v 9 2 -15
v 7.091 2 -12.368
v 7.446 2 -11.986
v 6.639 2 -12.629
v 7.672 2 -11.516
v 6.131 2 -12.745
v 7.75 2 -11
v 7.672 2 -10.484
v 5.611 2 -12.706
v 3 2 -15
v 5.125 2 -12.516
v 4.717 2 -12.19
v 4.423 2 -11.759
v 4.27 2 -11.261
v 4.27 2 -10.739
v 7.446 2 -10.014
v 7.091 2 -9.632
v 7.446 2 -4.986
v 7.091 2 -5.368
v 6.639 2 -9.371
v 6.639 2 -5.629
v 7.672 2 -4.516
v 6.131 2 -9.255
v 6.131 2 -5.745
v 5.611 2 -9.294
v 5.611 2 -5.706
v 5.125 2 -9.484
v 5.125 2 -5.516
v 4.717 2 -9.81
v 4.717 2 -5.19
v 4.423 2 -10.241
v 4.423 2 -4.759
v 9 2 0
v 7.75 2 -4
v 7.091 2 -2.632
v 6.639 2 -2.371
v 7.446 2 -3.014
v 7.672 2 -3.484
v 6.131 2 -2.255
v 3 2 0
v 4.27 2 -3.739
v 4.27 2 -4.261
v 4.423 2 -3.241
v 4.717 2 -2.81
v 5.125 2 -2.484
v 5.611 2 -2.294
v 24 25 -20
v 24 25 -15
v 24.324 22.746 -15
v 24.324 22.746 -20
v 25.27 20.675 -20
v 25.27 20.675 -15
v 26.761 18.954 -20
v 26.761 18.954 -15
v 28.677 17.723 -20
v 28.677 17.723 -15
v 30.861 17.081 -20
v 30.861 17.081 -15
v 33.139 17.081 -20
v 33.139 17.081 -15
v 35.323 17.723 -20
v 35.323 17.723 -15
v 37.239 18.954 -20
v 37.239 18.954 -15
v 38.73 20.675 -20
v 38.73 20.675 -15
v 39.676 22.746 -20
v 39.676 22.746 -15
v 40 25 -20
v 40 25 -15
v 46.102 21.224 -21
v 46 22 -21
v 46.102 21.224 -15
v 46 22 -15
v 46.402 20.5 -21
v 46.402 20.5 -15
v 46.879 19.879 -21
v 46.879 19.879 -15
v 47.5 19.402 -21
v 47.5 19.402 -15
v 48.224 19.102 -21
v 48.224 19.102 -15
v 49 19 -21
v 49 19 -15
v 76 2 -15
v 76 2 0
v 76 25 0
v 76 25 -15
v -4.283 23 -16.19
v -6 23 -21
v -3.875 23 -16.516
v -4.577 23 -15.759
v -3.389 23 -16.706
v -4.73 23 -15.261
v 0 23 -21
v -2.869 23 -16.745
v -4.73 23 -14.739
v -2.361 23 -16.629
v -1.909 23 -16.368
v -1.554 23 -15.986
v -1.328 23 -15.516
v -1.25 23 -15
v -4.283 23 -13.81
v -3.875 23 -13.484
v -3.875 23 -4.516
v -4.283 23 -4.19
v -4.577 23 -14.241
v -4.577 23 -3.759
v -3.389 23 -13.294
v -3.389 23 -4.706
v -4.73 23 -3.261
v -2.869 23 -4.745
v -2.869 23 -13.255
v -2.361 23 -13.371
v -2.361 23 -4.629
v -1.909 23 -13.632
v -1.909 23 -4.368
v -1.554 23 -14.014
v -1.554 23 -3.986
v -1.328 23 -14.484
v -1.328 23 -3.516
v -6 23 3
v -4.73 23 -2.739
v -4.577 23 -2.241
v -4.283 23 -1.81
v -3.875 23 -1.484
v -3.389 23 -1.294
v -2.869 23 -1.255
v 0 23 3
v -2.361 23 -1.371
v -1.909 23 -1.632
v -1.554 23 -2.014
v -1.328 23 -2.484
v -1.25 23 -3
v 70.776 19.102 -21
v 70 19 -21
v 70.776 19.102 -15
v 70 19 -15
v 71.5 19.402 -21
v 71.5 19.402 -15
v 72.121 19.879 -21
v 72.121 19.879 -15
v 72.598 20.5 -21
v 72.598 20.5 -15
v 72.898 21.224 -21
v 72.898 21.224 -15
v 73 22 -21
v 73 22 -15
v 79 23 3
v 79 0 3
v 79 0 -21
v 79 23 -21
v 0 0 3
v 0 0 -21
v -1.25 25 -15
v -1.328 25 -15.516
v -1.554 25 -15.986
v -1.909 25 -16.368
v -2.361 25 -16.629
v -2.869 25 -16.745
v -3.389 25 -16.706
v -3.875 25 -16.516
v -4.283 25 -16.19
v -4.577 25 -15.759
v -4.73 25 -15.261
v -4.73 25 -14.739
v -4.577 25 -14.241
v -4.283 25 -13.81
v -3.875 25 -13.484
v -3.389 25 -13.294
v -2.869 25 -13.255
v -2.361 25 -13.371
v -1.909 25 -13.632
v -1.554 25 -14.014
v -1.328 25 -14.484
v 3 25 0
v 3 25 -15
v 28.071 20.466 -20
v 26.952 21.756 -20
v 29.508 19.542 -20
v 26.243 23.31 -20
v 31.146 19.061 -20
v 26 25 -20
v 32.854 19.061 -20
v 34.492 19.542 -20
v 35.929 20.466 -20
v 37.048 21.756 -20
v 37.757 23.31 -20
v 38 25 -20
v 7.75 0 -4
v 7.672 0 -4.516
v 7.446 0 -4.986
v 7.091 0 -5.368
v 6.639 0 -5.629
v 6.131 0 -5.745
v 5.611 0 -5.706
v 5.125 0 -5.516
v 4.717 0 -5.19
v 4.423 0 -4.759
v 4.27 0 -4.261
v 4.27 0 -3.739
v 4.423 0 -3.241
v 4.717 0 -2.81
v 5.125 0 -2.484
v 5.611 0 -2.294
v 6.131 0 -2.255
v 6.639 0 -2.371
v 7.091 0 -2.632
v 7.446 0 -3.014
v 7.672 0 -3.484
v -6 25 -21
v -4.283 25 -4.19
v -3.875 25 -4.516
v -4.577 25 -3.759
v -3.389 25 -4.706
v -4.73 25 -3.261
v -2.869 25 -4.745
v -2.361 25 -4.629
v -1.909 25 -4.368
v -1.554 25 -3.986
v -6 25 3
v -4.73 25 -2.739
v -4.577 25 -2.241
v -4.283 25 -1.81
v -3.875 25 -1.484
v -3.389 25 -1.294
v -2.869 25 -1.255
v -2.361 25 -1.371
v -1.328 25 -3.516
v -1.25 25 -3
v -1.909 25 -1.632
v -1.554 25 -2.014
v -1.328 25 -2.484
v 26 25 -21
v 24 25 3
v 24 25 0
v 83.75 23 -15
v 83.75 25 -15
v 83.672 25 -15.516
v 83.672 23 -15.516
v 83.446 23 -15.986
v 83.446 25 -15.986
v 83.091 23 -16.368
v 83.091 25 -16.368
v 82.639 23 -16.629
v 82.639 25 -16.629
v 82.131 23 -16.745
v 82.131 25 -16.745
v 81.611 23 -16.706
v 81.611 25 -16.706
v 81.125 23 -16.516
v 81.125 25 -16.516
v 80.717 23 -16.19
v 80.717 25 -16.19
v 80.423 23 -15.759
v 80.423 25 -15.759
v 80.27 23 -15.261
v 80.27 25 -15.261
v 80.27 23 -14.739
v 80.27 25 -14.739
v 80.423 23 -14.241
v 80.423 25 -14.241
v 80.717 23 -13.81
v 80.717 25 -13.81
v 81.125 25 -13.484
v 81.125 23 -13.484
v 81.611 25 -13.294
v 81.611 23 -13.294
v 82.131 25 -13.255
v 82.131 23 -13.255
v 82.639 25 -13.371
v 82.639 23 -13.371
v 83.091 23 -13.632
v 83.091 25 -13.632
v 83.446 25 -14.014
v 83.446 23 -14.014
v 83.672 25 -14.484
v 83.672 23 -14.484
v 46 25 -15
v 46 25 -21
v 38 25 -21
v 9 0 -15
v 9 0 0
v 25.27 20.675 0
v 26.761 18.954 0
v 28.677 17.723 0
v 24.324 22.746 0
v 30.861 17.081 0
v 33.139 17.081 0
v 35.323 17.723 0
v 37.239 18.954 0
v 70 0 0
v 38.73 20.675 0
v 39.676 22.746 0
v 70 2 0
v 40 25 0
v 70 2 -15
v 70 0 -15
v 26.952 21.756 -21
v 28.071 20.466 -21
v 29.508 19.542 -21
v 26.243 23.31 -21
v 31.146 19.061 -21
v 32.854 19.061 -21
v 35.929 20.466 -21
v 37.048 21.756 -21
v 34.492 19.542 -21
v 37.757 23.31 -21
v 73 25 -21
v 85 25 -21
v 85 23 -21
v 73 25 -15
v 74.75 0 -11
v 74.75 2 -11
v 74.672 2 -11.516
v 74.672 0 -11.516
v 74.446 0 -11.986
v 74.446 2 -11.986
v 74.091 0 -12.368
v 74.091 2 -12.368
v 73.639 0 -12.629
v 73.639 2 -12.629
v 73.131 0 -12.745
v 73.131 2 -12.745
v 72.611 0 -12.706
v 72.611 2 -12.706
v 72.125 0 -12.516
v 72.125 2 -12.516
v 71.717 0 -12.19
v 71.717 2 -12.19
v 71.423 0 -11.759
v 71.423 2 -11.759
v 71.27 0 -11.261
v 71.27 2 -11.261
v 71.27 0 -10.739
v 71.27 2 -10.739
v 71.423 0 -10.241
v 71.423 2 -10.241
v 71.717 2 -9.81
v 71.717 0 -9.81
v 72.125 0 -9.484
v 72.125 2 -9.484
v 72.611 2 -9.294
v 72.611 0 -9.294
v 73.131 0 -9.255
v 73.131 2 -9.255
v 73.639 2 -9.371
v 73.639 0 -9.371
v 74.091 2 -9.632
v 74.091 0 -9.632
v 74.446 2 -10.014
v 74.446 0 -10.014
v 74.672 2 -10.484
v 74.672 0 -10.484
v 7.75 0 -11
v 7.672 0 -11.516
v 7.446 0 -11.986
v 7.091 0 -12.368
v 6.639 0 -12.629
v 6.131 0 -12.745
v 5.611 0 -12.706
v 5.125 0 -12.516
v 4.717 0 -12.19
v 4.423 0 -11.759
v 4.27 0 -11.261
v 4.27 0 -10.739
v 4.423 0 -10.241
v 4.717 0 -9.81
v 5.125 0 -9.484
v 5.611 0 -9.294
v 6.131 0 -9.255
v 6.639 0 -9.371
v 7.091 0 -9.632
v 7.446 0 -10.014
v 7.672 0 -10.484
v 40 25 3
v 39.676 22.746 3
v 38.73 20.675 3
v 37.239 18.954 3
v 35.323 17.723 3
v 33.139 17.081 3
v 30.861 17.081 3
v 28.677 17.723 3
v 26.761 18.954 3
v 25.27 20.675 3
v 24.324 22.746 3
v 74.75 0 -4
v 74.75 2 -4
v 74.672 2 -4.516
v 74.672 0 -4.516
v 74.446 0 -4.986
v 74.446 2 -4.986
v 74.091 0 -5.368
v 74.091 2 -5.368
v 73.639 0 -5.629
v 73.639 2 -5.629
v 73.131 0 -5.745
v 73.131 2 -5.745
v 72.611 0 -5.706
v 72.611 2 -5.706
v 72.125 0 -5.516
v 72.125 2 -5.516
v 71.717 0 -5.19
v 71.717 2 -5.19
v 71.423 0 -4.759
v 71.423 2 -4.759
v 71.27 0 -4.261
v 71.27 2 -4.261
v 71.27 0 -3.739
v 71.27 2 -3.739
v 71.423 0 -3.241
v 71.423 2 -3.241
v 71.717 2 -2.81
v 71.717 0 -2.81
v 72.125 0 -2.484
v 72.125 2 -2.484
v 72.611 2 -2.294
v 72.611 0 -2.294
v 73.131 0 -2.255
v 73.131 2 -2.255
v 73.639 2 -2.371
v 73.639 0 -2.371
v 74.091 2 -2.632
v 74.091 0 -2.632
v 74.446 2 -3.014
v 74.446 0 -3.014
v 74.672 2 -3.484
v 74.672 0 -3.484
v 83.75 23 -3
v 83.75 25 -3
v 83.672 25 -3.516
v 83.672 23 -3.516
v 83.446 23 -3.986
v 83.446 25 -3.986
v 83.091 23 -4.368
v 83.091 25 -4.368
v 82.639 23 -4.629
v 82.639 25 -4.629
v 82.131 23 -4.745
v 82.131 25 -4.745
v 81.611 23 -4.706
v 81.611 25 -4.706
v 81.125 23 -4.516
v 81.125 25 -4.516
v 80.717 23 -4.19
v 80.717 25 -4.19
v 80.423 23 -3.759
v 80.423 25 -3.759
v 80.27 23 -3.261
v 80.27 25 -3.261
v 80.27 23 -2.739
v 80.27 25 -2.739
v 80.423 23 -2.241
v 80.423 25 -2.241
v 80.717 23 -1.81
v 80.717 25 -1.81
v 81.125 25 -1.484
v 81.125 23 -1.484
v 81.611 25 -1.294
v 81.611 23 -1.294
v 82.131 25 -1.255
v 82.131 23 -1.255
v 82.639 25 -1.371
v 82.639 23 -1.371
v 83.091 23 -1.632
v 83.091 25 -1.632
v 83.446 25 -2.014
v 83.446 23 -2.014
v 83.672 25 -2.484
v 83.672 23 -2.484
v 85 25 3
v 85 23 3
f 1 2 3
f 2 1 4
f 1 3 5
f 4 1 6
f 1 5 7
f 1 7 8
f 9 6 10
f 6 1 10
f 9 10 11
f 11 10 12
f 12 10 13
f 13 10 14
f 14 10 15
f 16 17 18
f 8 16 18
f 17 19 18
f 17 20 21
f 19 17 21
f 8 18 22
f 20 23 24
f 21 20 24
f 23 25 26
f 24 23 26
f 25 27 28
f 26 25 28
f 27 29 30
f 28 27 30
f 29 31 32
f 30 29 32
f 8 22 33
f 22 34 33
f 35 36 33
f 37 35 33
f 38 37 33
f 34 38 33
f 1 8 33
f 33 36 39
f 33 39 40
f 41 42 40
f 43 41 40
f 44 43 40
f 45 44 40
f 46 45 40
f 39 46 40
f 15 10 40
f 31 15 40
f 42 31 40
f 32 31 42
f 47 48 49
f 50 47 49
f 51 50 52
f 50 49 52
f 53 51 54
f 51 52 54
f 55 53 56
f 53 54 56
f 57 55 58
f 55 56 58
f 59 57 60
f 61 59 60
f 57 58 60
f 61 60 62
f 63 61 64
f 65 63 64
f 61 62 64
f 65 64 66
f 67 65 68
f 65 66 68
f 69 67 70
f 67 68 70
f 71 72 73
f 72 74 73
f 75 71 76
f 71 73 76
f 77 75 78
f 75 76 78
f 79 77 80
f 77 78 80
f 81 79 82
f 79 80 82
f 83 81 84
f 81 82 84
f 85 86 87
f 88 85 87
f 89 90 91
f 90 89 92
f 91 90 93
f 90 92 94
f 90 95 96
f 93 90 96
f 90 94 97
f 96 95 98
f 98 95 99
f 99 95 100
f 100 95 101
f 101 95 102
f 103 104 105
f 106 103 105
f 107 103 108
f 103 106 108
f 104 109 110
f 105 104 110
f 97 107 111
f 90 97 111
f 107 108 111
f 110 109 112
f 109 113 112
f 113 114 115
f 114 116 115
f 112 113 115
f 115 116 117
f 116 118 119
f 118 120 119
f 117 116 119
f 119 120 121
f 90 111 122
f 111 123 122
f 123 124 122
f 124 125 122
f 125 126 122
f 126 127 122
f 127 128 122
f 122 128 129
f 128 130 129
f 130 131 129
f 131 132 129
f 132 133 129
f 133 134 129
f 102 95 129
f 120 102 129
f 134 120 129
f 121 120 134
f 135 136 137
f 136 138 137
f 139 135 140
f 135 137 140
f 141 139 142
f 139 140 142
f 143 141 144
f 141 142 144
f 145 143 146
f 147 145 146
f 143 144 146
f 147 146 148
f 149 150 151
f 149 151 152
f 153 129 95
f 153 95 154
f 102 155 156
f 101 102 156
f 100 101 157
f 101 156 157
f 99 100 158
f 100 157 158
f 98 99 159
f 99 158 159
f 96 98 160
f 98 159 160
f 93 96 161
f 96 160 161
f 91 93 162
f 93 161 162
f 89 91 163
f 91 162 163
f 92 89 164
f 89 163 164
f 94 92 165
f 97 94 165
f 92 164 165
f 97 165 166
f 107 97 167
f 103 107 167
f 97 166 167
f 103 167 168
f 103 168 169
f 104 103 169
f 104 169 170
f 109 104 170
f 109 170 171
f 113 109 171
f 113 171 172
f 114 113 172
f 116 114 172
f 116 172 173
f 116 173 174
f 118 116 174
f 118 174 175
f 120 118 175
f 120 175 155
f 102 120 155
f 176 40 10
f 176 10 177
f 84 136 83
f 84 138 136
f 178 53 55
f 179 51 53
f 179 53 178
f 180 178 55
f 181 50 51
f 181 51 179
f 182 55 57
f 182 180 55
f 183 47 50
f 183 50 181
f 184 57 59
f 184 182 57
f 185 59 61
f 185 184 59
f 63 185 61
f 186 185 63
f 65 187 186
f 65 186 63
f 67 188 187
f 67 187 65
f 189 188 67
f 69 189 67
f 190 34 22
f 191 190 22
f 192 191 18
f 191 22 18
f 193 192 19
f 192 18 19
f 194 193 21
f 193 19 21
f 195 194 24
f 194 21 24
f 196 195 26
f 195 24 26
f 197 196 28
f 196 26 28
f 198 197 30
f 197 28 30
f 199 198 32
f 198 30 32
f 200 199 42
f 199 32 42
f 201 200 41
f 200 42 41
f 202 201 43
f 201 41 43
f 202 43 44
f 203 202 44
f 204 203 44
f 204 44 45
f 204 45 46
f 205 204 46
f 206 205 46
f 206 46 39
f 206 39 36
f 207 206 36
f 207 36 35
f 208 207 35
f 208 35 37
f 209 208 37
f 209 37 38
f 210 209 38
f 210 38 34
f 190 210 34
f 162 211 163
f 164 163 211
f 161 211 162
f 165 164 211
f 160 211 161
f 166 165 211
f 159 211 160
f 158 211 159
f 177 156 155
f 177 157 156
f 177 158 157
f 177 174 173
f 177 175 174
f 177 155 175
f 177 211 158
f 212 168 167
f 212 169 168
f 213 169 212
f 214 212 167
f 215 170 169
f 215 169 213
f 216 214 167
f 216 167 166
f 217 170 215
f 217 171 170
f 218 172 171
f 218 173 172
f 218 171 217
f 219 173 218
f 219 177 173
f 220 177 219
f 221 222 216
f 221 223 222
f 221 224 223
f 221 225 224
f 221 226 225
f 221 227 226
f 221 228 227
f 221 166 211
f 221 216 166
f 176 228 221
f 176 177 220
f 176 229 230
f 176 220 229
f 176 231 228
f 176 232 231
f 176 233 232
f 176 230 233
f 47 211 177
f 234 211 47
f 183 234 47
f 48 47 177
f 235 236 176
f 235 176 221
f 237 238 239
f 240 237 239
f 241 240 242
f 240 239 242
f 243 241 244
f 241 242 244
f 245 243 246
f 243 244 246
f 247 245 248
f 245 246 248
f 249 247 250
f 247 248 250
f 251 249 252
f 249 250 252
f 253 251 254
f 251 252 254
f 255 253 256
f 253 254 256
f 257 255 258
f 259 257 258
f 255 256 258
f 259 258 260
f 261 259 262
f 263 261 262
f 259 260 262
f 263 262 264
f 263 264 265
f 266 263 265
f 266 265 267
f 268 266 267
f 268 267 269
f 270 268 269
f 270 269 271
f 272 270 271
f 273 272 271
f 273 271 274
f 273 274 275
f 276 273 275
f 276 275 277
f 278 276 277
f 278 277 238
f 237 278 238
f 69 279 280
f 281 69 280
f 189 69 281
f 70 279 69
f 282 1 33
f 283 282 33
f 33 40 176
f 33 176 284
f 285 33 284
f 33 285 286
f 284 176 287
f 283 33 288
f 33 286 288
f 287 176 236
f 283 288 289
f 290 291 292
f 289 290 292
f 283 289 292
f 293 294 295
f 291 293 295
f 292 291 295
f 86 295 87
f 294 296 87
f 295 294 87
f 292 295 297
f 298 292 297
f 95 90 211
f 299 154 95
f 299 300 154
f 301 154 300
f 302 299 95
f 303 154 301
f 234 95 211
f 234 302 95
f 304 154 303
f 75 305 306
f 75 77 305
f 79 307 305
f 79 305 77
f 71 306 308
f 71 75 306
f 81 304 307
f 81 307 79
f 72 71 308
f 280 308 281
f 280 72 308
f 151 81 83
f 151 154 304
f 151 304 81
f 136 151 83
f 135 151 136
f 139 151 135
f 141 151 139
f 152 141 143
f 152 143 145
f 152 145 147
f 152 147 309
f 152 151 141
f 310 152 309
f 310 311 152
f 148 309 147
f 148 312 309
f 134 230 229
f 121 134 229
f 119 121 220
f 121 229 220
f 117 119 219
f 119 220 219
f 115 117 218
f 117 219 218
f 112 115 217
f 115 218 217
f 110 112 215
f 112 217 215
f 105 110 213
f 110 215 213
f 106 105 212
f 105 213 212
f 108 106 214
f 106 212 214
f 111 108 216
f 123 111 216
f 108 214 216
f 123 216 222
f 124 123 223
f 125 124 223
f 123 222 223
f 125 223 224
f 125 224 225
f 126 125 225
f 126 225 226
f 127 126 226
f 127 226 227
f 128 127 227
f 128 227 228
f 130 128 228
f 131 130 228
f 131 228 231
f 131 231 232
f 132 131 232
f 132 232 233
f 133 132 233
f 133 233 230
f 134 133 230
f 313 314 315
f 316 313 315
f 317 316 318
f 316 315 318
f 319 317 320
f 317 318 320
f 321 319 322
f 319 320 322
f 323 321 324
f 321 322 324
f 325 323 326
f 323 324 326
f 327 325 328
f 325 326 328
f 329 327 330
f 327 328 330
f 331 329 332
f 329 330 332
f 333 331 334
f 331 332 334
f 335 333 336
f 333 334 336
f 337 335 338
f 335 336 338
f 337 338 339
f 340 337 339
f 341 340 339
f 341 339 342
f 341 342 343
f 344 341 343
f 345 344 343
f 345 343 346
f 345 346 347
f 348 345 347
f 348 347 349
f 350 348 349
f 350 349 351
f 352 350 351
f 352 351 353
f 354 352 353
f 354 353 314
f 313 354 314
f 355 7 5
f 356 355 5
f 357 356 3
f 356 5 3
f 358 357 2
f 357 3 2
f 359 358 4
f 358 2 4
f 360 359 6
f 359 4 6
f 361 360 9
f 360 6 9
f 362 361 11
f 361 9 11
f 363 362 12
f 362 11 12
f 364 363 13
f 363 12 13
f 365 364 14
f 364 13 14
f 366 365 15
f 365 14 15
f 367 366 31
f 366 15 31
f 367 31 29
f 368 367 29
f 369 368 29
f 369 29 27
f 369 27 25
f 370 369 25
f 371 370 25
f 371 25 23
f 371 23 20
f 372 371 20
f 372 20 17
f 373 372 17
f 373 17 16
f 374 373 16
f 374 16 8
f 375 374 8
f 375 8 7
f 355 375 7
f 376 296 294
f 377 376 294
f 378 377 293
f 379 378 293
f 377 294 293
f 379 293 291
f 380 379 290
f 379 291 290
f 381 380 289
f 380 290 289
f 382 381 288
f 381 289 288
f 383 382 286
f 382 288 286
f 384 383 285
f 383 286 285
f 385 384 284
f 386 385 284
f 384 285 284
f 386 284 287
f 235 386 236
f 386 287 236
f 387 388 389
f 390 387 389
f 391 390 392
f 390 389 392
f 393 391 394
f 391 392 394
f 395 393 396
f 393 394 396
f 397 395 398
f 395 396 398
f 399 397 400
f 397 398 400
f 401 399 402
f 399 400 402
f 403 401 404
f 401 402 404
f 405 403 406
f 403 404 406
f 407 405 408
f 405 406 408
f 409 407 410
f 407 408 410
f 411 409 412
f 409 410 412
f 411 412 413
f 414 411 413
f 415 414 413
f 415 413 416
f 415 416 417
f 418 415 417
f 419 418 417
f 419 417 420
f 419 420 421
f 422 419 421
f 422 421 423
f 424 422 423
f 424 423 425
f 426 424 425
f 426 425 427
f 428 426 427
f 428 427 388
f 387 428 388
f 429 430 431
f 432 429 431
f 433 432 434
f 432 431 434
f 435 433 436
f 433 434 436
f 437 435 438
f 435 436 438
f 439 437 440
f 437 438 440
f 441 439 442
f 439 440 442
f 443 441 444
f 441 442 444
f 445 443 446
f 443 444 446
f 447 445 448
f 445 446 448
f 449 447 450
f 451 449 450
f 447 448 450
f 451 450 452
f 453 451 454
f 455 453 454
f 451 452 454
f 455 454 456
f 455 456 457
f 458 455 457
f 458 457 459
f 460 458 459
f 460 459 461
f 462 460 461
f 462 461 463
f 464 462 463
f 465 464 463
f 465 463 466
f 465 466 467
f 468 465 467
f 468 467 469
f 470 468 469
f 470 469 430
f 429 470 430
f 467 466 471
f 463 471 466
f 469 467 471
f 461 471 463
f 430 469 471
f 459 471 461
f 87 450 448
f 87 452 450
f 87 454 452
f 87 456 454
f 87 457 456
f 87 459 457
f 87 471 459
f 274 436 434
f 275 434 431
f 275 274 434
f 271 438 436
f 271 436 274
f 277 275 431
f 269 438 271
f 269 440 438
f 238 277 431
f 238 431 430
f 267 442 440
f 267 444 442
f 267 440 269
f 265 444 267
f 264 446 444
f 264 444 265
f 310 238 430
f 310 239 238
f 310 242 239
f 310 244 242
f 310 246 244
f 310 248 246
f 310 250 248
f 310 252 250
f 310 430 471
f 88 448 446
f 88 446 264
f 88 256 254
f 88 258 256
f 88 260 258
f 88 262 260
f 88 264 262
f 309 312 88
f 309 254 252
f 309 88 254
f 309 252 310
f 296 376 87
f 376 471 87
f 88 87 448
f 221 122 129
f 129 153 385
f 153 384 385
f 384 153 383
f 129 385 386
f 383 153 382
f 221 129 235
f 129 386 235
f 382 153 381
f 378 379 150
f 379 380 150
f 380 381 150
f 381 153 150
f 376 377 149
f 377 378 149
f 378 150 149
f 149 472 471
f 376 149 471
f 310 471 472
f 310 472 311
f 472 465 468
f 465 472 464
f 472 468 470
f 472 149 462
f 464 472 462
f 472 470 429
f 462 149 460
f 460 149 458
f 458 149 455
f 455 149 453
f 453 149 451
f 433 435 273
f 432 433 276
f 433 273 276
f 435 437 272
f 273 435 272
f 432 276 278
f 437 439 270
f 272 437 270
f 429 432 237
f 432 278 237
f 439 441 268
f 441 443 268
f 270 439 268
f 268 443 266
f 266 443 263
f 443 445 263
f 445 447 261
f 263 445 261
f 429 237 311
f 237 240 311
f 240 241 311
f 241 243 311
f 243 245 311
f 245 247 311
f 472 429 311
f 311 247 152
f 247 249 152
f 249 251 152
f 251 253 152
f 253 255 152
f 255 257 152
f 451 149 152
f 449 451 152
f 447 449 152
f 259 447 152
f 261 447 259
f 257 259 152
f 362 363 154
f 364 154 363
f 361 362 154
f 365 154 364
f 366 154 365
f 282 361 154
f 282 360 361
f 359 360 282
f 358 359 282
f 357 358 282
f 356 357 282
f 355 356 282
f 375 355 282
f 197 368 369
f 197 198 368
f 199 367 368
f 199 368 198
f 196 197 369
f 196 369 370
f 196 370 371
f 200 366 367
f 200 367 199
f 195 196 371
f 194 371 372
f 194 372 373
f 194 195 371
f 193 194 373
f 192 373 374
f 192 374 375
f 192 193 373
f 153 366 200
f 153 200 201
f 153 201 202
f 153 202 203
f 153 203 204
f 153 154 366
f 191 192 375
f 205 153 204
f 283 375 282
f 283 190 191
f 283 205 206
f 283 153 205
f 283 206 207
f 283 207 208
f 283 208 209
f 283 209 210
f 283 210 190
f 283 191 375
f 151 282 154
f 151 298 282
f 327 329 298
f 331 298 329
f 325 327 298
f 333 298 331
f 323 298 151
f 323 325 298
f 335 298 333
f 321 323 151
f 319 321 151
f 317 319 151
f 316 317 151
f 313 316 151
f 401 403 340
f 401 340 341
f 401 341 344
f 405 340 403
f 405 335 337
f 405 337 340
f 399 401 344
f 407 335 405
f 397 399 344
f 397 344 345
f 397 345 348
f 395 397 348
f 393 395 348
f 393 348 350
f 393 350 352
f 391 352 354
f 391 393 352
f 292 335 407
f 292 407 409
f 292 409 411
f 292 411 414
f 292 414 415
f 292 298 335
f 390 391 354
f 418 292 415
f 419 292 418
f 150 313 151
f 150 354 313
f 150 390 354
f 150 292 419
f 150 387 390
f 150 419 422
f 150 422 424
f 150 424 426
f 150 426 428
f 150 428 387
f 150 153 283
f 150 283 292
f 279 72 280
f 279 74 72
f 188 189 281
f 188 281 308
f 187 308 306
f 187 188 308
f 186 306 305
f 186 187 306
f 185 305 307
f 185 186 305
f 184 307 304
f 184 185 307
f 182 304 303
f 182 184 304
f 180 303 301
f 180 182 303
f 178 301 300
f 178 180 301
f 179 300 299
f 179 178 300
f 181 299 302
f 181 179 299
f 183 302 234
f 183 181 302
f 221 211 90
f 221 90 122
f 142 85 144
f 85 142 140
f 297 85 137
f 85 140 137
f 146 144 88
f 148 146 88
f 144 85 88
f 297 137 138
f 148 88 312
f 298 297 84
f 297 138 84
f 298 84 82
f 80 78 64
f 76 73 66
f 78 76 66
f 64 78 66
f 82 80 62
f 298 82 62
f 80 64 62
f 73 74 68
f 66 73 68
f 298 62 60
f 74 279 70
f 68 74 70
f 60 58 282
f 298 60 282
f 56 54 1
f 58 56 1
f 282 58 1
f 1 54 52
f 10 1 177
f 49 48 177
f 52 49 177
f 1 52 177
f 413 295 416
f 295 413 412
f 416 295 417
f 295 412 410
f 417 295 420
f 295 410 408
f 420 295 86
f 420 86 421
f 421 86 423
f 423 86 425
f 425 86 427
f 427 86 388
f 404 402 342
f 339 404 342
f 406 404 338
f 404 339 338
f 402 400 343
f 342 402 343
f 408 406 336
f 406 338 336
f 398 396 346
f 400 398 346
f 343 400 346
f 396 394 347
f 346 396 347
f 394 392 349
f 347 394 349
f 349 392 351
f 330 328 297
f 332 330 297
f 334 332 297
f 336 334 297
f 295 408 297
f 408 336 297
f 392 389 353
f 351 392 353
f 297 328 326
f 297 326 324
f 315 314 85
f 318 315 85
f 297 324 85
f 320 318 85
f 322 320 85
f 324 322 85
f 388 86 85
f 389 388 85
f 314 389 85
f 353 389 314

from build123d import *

# Parameters (mm, degrees)
SALIENTE_EXTRUIR1_DEPTH    = 3
CROQUIS4_W                 = 3
CROQUIS4_H                 = 25
SALIENTE_EXTRUIR4_DEPTH    = 15
SALIENTE_EXTRUIR6_DEPTH    = 5
CROQUIS11_W                = 23
CROQUIS11_H                = 2
SALIENTE_EXTRUIR11_DEPTH   = 6
CROQUIS12_W                = 23
CROQUIS12_H                = 2
SALIENTE_EXTRUIR12_DEPTH   = 6
SALIENTE_EXTRUIR23_DEPTH   = 1
CROQUIS27_W                = 24
CROQUIS27_H                = 2
SALIENTE_EXTRUIR26_DEPTH   = 6
CROQUIS28_W                = 24
CROQUIS28_H                = 2
SALIENTE_EXTRUIR27_DEPTH   = 6
CROQUIS13_R                = 1.75
CORTAR_EXTRUIR1_DEPTH      = 1
CORTAR_EXTRUIR1_DEPTH_BACK = 26
REDONDEO1_R                = 3


with BuildPart() as part:
    # Croquis1 → Saliente-Extruir1 (new body)
    with BuildSketch(Plane.XY):
        with BuildLine():
            Line((79, 0), (79, 25))
            Line((79, 25), (40, 25))
            ThreePointArc((40, 25), (32, 17), (24, 25))
            Line((24, 25), (0, 25))
            Line((0, 25), (0, 0))
            Line((0, 0), (79, 0))
        make_face()
    extrude(amount=SALIENTE_EXTRUIR1_DEPTH)

    # Croquis4 → Saliente-Extruir4 (add)
    with BuildSketch(Plane(origin=(0, 0, 0), x_dir=(-1, 0, 0), z_dir=(0, 0, -1))):
        with Locations((-77.5, 12.5)):
            Rectangle(CROQUIS4_W, CROQUIS4_H)
        with Locations((-1.5, 12.5)):
            Rectangle(CROQUIS4_W, CROQUIS4_H)
    extrude(amount=SALIENTE_EXTRUIR4_DEPTH)

    # Croquis6 → Saliente-Extruir6 (add)
    with BuildSketch(Plane(origin=(0, 0, -15), x_dir=(-1, 0, 0), z_dir=(0, 0, -1))):
        with BuildLine():
            Line((-79, 25), (-79, 0))
            Line((-79, 0), (0, 0))
            Line((0, 0), (0, 25))
            Line((0, 25), (-24, 25))
            ThreePointArc((-24, 25), (-32, 17), (-40, 25))
            Line((-40, 25), (-46, 25))
            Line((-46, 25), (-46, 19))
            Line((-46, 19), (-73, 19))
            Line((-73, 19), (-73, 25))
            Line((-73, 25), (-79, 25))
        make_face()
    extrude(amount=SALIENTE_EXTRUIR6_DEPTH)

    # Croquis11 → Saliente-Extruir11 (add)
    with BuildSketch(Plane(origin=(76, 0, 0), x_dir=(0, 0, -1), z_dir=(1, 0, 0))):
        with Locations((8.5, 1)):
            Rectangle(CROQUIS11_W, CROQUIS11_H)
    extrude(amount=-SALIENTE_EXTRUIR11_DEPTH)

    # Croquis12 → Saliente-Extruir12 (add)
    with BuildSketch(Plane.ZY.offset(-3)):
        with Locations((-8.5, 1)):
            Rectangle(CROQUIS12_W, CROQUIS12_H)
    extrude(amount=-SALIENTE_EXTRUIR12_DEPTH)

    # Croquis24 → Saliente-Extruir23 (add)
    with BuildSketch(Plane(origin=(0, 0, -20), x_dir=(-1, 0, 0), z_dir=(0, 0, -1))):
        with BuildLine():
            Line((-79, 0), (-79, 25))
            Line((-79, 25), (-73, 25))
            Line((-73, 25), (-73, 19))
            Line((-73, 19), (-46, 19))
            Line((-46, 19), (-46, 25))
            Line((-46, 25), (-40, 25))
            Line((-40, 25), (-38, 25))
            ThreePointArc((-38, 25), (-32, 19), (-26, 25))
            Line((-26, 25), (0, 25))
            Line((0, 25), (0, 0))
            Line((0, 0), (-79, 0))
        make_face()
    extrude(amount=SALIENTE_EXTRUIR23_DEPTH)

    # Croquis27 → Saliente-Extruir26 (add)
    with BuildSketch(Plane(origin=(79, 0, 0), x_dir=(0, 0, -1), z_dir=(1, 0, 0))):
        with Locations((9, 24)):
            Rectangle(CROQUIS27_W, CROQUIS27_H)
    extrude(amount=SALIENTE_EXTRUIR26_DEPTH)

    # Croquis28 → Saliente-Extruir27 (add)
    with BuildSketch(Plane.ZY):
        with Locations((-9, 24)):
            Rectangle(CROQUIS28_W, CROQUIS28_H)
    extrude(amount=SALIENTE_EXTRUIR27_DEPTH)

    # Croquis13 → Cortar-Extruir1 (cut, two sides)
    with BuildSketch(Plane(origin=(0, 25, 0), x_dir=(1, 0, 0), z_dir=(0, 1, 0))) as cortar_extruir1_sk:
        with Locations((82, 15)):
            Circle(CROQUIS13_R)
        with Locations((82, 3)):
            Circle(CROQUIS13_R)
        with Locations((73, 11)):
            Circle(CROQUIS13_R)
        with Locations((73, 4)):
            Circle(CROQUIS13_R)
        with Locations((6, 4)):
            Circle(CROQUIS13_R)
        with Locations((6, 11)):
            Circle(CROQUIS13_R)
        with Locations((-3, 3)):
            Circle(CROQUIS13_R)
        with Locations((-3, 15)):
            Circle(CROQUIS13_R)
    extrude(amount=CORTAR_EXTRUIR1_DEPTH, mode=Mode.SUBTRACT)
    extrude(cortar_extruir1_sk.sketch, amount=-CORTAR_EXTRUIR1_DEPTH_BACK, mode=Mode.SUBTRACT)

    # Redondeo1
    redondeo1_edges = [part.edges().sort_by_distance(p)[0] for p in [
        (46, 19, -18),
        (73, 19, -18),
    ]]
    fillet(redondeo1_edges, radius=REDONDEO1_R)


solid = part.part
